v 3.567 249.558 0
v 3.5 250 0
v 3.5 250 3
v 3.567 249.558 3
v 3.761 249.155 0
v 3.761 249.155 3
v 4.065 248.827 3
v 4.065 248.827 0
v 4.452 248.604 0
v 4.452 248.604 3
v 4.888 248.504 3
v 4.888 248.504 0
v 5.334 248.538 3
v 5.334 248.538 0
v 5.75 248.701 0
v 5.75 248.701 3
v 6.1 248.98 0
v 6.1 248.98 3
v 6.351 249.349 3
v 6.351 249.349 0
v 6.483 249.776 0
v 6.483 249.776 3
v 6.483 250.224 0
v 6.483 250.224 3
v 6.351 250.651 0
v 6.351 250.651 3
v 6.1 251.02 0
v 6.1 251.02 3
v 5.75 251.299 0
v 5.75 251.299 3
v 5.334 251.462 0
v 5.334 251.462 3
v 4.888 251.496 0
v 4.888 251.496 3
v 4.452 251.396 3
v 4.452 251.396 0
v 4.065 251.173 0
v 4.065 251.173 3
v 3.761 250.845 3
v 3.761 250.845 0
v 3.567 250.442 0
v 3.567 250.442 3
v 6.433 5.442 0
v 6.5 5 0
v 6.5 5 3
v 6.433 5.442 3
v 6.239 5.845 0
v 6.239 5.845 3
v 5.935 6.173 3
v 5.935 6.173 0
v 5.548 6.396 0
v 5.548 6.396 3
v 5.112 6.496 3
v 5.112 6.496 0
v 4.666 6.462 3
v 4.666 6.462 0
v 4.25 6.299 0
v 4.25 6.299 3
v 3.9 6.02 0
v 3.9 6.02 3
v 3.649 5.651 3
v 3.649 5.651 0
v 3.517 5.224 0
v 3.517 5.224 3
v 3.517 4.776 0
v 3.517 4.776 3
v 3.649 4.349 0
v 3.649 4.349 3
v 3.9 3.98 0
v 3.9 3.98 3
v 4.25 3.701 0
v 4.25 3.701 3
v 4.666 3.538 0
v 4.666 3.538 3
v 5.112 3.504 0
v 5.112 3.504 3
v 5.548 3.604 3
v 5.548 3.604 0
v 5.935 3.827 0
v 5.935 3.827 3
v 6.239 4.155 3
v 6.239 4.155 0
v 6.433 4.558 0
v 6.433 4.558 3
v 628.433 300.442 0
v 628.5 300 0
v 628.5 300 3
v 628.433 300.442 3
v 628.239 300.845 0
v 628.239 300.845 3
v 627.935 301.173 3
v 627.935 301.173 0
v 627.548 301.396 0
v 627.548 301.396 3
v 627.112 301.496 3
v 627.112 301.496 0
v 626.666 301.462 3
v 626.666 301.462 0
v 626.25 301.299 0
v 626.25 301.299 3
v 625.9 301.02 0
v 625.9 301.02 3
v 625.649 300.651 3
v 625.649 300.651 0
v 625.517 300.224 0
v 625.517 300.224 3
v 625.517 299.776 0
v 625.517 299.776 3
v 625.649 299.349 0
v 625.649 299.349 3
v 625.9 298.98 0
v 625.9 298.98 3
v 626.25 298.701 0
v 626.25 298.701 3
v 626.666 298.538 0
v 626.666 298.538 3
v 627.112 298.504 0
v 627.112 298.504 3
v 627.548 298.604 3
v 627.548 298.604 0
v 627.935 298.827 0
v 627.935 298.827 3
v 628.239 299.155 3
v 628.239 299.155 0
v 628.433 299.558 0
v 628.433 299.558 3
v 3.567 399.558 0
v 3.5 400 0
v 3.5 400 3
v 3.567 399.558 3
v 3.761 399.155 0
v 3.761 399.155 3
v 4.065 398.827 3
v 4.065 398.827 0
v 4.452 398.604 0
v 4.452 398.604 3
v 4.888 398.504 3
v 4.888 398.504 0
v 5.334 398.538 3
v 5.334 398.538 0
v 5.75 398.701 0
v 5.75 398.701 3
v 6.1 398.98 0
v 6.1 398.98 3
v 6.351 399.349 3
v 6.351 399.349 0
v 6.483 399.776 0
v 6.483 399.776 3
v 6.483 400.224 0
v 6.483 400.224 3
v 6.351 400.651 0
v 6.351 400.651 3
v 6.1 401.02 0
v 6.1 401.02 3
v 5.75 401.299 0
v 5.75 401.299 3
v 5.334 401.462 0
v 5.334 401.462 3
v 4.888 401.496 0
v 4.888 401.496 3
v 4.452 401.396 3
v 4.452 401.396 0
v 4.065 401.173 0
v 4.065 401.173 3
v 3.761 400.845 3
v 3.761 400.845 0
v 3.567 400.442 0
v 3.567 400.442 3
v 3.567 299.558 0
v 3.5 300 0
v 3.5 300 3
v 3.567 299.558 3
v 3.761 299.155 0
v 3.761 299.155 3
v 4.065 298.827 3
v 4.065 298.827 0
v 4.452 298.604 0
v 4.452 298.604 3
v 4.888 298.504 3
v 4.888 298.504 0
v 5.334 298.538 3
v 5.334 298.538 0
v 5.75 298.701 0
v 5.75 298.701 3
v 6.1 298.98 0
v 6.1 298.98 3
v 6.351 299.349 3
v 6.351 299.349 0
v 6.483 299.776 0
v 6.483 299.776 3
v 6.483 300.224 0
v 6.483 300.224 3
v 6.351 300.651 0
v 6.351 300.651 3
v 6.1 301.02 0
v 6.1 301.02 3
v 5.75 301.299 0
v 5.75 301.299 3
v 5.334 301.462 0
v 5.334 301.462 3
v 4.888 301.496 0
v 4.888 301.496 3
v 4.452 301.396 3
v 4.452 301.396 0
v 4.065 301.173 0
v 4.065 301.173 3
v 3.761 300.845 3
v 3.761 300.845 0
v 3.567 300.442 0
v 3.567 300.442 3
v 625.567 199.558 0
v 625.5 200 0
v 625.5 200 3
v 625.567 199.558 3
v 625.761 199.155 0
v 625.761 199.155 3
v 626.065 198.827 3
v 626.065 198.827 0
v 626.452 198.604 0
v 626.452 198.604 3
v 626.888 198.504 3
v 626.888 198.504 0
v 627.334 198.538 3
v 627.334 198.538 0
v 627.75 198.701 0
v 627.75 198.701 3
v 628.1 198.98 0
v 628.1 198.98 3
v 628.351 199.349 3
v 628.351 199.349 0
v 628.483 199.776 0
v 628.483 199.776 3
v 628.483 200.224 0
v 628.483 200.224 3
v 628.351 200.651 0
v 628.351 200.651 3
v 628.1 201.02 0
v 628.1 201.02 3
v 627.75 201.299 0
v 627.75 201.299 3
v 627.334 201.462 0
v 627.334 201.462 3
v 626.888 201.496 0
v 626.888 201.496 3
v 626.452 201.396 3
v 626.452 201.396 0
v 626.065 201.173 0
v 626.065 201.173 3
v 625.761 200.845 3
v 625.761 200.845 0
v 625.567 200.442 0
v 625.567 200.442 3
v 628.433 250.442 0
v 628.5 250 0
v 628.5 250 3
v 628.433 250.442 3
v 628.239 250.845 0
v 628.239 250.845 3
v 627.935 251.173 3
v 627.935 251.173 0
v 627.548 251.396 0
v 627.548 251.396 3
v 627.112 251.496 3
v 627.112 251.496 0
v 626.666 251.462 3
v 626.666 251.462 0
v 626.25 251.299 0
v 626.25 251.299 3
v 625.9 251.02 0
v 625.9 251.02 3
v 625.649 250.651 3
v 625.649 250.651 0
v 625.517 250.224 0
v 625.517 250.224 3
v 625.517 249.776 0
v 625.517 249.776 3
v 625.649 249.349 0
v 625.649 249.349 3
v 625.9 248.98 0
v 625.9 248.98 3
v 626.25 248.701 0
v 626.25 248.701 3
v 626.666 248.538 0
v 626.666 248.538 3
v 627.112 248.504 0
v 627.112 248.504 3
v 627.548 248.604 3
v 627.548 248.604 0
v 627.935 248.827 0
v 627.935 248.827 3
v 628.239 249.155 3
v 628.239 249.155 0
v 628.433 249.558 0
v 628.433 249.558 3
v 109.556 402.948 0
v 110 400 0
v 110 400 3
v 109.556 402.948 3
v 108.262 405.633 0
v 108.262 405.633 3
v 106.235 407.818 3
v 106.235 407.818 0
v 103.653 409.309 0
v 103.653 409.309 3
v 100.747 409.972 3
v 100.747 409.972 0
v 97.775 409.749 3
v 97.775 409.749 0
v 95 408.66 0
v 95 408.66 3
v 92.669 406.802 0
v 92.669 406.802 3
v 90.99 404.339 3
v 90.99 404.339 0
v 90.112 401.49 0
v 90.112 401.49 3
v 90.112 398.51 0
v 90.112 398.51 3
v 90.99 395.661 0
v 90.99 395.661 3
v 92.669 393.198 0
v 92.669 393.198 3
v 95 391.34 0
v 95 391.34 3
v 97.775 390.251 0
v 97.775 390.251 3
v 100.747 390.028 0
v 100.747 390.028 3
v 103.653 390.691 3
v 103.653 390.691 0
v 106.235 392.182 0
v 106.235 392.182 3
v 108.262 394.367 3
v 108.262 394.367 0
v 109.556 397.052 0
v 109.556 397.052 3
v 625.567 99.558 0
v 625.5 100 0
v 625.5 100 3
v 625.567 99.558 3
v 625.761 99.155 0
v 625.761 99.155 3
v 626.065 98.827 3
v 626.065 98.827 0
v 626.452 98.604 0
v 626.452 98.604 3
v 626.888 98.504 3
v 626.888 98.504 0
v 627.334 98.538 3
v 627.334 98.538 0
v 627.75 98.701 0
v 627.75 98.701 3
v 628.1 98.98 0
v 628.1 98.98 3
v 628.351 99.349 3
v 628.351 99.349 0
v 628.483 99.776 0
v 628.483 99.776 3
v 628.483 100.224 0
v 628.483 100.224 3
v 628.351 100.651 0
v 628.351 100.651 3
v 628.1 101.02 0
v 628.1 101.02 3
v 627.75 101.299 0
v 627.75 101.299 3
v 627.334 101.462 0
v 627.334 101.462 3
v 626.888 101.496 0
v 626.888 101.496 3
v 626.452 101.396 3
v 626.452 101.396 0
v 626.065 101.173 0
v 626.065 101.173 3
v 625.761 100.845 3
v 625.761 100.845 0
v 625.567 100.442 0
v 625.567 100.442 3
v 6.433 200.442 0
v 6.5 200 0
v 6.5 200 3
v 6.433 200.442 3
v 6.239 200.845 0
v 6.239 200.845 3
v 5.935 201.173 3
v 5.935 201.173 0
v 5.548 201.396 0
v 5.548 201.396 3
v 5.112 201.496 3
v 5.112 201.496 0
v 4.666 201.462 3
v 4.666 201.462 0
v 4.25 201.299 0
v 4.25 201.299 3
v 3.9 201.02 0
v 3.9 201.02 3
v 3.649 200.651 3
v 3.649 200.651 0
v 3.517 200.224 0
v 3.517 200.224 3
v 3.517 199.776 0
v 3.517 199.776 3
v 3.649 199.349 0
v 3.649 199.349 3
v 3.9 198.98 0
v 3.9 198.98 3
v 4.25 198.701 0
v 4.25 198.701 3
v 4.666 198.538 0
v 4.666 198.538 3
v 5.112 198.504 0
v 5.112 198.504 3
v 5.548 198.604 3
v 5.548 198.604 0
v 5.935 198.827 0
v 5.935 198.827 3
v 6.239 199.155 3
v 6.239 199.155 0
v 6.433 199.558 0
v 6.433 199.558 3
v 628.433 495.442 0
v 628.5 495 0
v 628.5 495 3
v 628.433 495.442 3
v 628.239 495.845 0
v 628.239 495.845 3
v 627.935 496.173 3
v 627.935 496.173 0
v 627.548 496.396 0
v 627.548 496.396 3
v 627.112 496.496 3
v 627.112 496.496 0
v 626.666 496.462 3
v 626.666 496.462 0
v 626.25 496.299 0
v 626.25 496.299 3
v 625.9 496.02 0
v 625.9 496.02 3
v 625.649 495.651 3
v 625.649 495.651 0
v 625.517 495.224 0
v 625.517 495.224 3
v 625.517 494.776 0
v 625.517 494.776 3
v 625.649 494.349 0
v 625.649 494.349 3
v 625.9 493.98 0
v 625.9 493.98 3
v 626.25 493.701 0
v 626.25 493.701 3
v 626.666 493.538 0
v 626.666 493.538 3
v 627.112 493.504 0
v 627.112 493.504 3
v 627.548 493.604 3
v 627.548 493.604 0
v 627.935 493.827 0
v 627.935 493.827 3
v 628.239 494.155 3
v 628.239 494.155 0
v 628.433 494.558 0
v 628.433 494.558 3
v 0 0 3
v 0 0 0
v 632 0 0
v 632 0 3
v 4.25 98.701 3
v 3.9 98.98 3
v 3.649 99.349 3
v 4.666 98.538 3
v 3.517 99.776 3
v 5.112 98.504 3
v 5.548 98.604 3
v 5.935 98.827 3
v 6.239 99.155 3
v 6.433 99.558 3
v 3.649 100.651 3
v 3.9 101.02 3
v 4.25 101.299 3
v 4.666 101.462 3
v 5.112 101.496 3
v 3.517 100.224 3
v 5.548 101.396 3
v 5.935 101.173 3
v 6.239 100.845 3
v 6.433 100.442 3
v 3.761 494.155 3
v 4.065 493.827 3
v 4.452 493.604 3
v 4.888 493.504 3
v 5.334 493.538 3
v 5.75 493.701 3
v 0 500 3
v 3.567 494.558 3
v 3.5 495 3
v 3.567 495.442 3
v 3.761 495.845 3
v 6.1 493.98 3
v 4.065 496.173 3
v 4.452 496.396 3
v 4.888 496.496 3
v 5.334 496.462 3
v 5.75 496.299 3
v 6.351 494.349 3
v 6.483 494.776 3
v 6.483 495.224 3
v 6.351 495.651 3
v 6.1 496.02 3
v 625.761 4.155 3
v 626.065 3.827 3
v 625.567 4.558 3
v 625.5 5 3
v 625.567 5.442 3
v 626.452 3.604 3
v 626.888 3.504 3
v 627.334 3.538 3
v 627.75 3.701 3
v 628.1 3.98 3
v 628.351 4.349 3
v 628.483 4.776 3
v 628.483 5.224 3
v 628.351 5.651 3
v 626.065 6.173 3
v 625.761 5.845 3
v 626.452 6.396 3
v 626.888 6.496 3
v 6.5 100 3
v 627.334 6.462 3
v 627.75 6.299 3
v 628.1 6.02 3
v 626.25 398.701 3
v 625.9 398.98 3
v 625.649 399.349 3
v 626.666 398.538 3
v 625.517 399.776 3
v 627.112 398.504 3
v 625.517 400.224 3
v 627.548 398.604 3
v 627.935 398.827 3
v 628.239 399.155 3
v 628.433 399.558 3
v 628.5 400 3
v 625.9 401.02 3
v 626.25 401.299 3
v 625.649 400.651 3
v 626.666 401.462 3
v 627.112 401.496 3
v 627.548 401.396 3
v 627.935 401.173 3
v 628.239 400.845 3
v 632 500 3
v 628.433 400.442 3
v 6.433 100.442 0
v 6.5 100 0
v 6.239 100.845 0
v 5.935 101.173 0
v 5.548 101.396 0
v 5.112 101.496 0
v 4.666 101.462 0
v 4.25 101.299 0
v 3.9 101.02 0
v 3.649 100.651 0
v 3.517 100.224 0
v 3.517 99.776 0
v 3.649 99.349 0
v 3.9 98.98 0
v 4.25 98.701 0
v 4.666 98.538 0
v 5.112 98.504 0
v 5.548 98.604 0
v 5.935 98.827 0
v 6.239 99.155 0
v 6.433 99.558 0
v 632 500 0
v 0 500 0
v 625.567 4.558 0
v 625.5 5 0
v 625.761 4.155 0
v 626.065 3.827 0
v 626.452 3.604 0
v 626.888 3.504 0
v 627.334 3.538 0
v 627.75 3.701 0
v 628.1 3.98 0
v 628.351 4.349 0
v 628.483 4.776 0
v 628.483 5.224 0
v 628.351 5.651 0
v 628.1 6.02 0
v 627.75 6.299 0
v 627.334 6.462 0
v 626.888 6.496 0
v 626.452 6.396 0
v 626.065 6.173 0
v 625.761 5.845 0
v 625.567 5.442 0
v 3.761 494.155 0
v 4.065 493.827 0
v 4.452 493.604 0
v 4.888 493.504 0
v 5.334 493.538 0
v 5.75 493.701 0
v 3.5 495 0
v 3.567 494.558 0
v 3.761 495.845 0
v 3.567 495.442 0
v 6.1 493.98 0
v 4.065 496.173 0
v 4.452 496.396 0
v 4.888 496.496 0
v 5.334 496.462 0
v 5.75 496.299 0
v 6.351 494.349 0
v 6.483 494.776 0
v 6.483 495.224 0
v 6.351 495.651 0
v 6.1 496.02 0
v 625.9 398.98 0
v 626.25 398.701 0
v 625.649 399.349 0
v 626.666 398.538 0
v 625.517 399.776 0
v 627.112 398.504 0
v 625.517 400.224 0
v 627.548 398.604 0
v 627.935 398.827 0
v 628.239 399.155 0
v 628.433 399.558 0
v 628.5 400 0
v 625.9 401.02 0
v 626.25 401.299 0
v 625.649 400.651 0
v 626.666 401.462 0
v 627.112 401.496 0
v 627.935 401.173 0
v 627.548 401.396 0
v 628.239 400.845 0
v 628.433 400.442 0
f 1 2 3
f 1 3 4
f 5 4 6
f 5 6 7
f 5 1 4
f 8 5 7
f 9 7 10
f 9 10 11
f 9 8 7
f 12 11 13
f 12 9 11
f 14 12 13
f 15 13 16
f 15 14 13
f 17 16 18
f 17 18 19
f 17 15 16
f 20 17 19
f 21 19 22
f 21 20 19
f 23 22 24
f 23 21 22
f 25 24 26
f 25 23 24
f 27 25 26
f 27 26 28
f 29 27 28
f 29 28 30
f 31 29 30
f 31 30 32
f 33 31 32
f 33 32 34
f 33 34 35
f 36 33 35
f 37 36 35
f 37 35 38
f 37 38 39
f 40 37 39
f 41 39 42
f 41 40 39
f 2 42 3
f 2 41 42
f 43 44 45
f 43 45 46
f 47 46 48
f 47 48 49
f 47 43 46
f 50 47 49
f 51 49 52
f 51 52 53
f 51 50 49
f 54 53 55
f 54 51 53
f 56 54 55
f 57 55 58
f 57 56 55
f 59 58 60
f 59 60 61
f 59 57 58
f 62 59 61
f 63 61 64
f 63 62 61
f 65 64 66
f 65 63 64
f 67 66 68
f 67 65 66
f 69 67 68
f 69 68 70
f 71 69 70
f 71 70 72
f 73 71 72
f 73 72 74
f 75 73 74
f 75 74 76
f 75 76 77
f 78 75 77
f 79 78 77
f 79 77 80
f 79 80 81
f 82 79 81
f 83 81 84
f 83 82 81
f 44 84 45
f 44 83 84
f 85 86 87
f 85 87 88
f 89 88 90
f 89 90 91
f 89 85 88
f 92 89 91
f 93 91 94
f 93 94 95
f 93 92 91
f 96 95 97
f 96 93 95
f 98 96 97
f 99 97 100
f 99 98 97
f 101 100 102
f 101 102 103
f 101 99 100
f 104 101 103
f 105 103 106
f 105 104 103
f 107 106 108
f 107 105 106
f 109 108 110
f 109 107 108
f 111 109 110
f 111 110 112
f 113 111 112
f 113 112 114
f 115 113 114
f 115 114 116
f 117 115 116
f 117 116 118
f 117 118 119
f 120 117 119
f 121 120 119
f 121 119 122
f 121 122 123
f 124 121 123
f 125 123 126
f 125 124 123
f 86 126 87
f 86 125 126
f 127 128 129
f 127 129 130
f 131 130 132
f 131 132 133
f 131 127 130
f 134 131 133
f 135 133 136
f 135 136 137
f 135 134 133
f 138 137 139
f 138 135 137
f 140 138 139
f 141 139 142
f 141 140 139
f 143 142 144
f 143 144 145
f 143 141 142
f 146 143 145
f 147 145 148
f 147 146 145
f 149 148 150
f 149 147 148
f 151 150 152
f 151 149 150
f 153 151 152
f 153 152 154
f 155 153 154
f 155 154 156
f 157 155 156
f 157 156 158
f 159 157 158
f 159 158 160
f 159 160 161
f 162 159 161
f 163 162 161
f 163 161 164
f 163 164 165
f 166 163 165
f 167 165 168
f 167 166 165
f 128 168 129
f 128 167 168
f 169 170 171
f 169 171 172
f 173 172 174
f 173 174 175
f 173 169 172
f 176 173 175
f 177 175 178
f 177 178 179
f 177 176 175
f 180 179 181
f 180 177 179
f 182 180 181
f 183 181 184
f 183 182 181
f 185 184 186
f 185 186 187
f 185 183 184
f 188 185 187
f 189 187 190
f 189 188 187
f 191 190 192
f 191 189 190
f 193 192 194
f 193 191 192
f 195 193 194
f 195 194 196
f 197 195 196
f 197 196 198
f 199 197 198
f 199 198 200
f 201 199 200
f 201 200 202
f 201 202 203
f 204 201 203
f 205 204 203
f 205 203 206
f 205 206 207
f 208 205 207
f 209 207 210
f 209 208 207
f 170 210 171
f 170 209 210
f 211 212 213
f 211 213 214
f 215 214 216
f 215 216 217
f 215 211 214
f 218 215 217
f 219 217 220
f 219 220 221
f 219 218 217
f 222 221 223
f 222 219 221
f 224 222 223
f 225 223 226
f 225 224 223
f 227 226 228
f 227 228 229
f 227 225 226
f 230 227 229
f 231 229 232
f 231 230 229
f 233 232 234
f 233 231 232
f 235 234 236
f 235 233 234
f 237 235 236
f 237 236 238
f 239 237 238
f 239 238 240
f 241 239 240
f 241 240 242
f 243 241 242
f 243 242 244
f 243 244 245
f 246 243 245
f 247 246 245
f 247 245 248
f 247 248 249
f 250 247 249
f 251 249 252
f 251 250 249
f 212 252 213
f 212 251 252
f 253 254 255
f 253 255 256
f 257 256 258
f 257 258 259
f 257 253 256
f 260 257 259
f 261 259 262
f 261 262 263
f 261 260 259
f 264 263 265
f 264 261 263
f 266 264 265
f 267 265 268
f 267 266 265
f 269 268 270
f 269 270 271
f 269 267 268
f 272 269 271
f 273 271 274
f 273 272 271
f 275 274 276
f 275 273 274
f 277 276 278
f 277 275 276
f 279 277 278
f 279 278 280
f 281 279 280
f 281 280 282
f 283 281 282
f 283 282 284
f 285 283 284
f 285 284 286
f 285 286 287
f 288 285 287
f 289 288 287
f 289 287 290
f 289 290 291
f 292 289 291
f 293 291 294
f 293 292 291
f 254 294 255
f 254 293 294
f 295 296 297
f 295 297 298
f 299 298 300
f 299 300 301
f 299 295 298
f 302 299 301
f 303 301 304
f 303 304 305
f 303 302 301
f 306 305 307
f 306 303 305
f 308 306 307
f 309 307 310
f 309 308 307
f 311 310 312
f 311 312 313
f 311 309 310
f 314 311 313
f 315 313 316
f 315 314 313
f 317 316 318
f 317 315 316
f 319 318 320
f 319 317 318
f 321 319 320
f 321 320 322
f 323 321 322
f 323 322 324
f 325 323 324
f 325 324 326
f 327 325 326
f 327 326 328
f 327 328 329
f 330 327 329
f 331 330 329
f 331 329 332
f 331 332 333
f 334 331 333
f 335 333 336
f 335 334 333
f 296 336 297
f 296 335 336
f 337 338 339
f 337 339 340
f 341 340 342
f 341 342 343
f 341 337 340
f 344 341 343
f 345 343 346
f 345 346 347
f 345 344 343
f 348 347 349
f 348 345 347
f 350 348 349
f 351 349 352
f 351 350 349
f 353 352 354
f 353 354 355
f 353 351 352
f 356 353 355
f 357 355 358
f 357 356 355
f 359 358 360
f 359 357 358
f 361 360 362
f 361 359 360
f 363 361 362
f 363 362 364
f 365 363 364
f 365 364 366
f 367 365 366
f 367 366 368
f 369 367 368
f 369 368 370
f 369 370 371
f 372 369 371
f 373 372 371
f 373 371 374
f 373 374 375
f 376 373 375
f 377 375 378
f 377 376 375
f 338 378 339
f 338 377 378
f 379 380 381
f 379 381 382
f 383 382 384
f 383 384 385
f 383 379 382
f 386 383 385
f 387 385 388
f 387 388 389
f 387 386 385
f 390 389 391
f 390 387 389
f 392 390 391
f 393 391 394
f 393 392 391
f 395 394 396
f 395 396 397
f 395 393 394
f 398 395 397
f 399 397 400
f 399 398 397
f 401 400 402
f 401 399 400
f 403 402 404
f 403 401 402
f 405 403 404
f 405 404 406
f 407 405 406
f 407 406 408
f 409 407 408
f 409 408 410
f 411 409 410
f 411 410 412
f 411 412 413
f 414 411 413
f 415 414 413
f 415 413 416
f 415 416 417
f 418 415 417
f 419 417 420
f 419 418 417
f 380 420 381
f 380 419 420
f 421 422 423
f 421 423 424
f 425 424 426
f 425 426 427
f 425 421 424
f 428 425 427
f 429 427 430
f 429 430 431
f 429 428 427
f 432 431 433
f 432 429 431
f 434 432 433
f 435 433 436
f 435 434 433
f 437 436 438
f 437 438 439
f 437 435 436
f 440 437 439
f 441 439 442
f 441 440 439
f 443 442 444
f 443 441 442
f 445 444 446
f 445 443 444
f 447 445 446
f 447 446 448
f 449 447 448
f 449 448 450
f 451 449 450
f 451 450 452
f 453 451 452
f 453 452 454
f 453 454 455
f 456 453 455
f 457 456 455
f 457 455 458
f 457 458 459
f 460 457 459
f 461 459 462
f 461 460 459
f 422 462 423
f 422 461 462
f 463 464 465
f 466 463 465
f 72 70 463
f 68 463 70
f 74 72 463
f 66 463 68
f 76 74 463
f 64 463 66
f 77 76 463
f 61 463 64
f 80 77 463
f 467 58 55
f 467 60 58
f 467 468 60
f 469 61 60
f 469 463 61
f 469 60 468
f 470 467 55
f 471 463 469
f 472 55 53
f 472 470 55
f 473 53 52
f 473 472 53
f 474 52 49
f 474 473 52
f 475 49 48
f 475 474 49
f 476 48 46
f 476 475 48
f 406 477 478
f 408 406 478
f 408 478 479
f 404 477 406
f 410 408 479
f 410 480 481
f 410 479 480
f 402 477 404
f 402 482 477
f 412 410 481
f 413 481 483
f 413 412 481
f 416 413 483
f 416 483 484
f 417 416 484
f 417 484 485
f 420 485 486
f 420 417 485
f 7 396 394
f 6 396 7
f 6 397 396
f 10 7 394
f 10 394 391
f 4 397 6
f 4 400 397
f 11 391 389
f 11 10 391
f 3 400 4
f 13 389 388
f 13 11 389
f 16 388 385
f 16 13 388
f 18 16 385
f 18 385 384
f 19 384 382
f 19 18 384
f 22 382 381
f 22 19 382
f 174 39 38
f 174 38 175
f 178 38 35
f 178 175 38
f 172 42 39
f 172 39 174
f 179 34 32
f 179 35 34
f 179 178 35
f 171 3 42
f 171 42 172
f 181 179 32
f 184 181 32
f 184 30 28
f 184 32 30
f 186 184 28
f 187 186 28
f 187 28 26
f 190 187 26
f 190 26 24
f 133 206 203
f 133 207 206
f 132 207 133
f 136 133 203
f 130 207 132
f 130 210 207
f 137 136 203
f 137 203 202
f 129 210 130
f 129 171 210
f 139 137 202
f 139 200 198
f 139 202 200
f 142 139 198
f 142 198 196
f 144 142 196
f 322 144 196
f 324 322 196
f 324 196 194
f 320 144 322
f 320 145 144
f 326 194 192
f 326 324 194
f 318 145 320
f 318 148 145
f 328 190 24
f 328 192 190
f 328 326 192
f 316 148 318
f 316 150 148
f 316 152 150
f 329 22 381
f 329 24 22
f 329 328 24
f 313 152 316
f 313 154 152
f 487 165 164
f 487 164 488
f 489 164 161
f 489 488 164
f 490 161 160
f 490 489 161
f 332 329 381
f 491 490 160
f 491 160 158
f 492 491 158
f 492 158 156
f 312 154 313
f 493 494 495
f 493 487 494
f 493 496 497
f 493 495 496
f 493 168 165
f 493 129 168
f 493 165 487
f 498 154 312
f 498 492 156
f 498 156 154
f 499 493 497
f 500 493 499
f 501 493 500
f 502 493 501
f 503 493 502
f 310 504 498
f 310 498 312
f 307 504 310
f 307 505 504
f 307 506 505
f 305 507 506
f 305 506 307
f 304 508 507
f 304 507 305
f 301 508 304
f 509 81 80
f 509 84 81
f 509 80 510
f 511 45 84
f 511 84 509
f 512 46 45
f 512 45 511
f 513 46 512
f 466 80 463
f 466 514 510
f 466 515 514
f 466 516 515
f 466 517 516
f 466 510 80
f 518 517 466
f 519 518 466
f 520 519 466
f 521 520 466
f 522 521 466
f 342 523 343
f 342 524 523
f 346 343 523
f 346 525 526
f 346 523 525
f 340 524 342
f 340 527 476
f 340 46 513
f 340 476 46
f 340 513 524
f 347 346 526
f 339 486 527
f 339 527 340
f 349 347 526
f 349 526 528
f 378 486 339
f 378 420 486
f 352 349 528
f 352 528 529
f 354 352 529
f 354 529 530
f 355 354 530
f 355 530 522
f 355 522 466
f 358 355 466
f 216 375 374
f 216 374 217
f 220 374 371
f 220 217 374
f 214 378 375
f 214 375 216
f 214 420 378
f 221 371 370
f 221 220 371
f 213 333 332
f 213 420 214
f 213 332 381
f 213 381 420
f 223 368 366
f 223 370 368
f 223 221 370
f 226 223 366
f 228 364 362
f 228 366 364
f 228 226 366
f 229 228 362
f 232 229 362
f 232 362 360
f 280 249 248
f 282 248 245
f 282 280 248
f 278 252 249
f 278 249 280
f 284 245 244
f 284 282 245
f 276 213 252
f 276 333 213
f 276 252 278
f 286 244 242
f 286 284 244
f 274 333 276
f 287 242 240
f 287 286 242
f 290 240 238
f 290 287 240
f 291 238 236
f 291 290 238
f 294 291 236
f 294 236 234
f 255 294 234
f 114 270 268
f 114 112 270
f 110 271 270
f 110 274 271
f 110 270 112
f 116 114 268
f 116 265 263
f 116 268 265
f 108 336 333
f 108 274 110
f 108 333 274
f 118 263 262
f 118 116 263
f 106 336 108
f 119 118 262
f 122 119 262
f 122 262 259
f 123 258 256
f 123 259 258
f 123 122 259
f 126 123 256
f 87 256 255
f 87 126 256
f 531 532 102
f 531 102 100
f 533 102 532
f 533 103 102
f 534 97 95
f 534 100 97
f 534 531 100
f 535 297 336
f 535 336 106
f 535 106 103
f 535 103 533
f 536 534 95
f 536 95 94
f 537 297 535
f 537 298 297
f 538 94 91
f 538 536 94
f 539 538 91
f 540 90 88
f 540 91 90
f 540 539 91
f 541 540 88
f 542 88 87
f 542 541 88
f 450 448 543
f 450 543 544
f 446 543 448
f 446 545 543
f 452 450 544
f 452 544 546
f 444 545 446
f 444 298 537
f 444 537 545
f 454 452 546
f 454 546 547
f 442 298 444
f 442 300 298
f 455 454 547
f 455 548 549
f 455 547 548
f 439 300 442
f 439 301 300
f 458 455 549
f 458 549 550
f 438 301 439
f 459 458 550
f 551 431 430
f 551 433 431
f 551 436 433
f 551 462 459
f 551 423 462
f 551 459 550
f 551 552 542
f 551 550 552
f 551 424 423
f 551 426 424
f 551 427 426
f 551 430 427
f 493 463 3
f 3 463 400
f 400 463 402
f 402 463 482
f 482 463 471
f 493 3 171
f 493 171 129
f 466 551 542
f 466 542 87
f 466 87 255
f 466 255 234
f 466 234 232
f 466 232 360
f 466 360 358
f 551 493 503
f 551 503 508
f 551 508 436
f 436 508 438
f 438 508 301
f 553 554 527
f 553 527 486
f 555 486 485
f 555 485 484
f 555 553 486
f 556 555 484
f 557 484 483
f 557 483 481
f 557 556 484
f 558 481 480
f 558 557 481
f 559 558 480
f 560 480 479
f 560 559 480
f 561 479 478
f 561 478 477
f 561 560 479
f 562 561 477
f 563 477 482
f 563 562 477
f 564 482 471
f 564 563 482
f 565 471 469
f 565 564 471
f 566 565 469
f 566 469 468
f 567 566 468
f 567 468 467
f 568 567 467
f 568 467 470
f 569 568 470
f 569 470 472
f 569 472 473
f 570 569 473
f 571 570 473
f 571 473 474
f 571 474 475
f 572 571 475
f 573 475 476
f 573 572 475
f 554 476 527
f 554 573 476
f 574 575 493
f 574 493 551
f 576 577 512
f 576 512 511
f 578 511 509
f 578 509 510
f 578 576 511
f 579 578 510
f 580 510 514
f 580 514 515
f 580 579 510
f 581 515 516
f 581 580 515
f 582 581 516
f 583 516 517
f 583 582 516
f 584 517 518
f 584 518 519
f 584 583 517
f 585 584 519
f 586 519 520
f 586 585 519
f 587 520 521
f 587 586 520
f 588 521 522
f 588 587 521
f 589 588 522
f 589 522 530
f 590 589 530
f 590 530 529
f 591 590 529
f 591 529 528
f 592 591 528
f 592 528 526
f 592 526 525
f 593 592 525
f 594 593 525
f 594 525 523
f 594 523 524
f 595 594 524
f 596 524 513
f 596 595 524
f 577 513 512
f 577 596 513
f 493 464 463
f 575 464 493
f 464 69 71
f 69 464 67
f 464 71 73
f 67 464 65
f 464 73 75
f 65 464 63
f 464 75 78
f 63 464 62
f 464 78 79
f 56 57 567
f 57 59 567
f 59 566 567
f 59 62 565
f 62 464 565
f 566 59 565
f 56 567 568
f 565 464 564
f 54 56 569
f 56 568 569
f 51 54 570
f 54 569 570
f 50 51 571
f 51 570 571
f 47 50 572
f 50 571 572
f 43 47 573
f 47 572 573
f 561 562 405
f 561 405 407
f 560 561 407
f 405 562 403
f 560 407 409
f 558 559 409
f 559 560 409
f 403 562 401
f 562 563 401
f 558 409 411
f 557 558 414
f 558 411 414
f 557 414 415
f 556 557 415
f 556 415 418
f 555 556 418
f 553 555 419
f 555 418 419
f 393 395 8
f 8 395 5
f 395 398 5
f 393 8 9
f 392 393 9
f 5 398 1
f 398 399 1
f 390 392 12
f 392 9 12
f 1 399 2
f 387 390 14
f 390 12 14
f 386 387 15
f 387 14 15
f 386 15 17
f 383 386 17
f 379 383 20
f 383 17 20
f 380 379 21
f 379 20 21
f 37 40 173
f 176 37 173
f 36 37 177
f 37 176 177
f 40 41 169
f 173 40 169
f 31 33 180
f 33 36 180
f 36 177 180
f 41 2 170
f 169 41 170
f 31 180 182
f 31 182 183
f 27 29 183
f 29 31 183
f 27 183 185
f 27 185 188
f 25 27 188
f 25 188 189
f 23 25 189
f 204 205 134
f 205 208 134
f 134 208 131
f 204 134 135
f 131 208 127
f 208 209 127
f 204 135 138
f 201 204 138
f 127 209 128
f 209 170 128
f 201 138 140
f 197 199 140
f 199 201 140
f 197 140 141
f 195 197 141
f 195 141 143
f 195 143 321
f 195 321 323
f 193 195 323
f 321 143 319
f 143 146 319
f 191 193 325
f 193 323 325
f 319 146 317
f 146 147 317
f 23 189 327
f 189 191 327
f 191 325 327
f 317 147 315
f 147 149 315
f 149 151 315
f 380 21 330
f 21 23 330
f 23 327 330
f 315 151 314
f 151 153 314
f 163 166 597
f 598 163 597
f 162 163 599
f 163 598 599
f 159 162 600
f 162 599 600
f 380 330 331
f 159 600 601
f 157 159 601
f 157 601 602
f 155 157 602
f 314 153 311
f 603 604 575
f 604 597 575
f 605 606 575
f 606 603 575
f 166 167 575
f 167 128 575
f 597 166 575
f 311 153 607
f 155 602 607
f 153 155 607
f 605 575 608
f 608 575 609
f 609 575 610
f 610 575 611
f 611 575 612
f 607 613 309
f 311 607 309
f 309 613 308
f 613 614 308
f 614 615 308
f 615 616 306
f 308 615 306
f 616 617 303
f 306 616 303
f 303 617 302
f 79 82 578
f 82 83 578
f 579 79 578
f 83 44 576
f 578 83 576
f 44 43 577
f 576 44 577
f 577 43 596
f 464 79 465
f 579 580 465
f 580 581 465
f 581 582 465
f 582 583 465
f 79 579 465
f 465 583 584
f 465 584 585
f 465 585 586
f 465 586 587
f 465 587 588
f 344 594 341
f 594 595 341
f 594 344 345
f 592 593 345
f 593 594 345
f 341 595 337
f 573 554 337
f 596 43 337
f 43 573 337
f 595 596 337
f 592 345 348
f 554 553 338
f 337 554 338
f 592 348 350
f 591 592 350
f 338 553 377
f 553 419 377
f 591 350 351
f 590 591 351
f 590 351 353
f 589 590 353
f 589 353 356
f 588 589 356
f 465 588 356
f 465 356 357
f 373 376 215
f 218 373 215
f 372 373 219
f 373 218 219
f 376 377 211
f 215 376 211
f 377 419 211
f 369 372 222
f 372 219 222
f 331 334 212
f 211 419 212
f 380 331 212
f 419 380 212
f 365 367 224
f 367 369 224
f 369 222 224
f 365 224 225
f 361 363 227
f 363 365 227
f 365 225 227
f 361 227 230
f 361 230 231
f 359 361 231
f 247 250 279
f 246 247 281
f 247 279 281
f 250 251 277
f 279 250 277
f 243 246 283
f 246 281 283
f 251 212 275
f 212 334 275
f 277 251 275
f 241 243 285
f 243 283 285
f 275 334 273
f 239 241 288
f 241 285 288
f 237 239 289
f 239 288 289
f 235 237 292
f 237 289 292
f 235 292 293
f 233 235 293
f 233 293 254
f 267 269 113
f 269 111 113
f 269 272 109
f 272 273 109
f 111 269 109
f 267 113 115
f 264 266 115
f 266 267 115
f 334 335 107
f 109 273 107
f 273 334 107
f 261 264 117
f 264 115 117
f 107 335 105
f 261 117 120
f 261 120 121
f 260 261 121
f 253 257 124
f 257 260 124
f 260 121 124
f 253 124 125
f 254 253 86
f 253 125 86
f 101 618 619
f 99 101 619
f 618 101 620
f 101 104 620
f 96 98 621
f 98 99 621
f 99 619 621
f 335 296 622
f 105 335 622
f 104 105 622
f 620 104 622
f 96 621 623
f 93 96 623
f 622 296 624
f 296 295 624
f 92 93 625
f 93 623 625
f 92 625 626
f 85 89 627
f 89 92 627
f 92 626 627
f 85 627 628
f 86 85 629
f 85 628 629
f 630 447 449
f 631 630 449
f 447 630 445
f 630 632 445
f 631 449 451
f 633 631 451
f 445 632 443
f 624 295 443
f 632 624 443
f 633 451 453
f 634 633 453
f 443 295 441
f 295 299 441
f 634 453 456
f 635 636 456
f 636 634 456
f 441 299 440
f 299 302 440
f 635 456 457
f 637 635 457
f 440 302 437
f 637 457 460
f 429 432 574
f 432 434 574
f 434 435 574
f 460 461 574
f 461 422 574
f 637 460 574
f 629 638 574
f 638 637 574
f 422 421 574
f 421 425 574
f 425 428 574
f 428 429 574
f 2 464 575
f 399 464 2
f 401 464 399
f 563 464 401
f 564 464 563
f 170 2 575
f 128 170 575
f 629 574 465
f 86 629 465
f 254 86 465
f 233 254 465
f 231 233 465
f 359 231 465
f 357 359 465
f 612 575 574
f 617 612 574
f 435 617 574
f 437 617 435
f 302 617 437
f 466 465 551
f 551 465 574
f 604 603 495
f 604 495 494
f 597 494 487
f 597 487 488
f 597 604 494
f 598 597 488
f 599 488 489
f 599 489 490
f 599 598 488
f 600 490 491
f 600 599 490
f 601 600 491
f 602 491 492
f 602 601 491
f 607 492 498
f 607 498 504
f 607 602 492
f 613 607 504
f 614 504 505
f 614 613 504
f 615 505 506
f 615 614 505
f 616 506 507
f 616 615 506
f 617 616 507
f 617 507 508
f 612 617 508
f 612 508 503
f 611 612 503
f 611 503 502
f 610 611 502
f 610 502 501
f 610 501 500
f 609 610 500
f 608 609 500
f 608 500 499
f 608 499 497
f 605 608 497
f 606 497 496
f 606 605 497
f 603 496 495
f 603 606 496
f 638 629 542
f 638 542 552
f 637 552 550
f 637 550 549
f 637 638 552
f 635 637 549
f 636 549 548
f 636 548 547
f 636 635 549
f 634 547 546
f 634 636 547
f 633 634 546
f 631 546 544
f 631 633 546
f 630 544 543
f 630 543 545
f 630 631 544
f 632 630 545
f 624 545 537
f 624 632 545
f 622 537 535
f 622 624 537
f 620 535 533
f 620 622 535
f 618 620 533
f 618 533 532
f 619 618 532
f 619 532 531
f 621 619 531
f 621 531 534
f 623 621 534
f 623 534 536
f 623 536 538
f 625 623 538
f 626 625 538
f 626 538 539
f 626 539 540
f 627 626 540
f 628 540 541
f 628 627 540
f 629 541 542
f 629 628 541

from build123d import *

# Parameters (mm, degrees)
SKETCH_1_W      = 632
SKETCH_1_H      = 500
SKETCH_1_R      = 1.5
SKETCH_1_R_2    = 10
EXTRUDE_1_DEPTH = 3


with BuildPart() as part:
    # 草图1 → 凸台-拉伸1 (new body)
    with BuildSketch(Plane.XY):
        with Locations((316, 250)):
            Rectangle(SKETCH_1_W, SKETCH_1_H)
        with Locations((627, 250)):
            Circle(SKETCH_1_R, mode=Mode.SUBTRACT)
        with Locations((627, 300)):
            Circle(SKETCH_1_R, mode=Mode.SUBTRACT)
        with Locations((627, 400)):
            Circle(SKETCH_1_R, mode=Mode.SUBTRACT)
        with Locations((627, 495)):
            Circle(SKETCH_1_R, mode=Mode.SUBTRACT)
        with Locations(Location((627, 5, 0), (0, 0, 180))):
            Circle(SKETCH_1_R, mode=Mode.SUBTRACT)
        with Locations(Location((627, 100, 0), (0, 0, 180))):
            Circle(SKETCH_1_R, mode=Mode.SUBTRACT)
        with Locations(Location((627, 200, 0), (0, 0, 180))):
            Circle(SKETCH_1_R, mode=Mode.SUBTRACT)
        with Locations((5, 200)):
            Circle(SKETCH_1_R, mode=Mode.SUBTRACT)
        with Locations((5, 100)):
            Circle(SKETCH_1_R, mode=Mode.SUBTRACT)
        with Locations((5, 5)):
            Circle(SKETCH_1_R, mode=Mode.SUBTRACT)
        with Locations(Location((5, 495, 0), (0, 0, 180))):
            Circle(SKETCH_1_R, mode=Mode.SUBTRACT)
        with Locations(Location((5, 400, 0), (0, 0, 180))):
            Circle(SKETCH_1_R, mode=Mode.SUBTRACT)
        with Locations(Location((5, 300, 0), (0, 0, 180))):
            Circle(SKETCH_1_R, mode=Mode.SUBTRACT)
        with Locations(Location((5, 250, 0), (0, 0, 180))):
            Circle(SKETCH_1_R, mode=Mode.SUBTRACT)
        with Locations((100, 400)):
            Circle(SKETCH_1_R_2, mode=Mode.SUBTRACT)
    extrude(amount=EXTRUDE_1_DEPTH)


solid = part.part
